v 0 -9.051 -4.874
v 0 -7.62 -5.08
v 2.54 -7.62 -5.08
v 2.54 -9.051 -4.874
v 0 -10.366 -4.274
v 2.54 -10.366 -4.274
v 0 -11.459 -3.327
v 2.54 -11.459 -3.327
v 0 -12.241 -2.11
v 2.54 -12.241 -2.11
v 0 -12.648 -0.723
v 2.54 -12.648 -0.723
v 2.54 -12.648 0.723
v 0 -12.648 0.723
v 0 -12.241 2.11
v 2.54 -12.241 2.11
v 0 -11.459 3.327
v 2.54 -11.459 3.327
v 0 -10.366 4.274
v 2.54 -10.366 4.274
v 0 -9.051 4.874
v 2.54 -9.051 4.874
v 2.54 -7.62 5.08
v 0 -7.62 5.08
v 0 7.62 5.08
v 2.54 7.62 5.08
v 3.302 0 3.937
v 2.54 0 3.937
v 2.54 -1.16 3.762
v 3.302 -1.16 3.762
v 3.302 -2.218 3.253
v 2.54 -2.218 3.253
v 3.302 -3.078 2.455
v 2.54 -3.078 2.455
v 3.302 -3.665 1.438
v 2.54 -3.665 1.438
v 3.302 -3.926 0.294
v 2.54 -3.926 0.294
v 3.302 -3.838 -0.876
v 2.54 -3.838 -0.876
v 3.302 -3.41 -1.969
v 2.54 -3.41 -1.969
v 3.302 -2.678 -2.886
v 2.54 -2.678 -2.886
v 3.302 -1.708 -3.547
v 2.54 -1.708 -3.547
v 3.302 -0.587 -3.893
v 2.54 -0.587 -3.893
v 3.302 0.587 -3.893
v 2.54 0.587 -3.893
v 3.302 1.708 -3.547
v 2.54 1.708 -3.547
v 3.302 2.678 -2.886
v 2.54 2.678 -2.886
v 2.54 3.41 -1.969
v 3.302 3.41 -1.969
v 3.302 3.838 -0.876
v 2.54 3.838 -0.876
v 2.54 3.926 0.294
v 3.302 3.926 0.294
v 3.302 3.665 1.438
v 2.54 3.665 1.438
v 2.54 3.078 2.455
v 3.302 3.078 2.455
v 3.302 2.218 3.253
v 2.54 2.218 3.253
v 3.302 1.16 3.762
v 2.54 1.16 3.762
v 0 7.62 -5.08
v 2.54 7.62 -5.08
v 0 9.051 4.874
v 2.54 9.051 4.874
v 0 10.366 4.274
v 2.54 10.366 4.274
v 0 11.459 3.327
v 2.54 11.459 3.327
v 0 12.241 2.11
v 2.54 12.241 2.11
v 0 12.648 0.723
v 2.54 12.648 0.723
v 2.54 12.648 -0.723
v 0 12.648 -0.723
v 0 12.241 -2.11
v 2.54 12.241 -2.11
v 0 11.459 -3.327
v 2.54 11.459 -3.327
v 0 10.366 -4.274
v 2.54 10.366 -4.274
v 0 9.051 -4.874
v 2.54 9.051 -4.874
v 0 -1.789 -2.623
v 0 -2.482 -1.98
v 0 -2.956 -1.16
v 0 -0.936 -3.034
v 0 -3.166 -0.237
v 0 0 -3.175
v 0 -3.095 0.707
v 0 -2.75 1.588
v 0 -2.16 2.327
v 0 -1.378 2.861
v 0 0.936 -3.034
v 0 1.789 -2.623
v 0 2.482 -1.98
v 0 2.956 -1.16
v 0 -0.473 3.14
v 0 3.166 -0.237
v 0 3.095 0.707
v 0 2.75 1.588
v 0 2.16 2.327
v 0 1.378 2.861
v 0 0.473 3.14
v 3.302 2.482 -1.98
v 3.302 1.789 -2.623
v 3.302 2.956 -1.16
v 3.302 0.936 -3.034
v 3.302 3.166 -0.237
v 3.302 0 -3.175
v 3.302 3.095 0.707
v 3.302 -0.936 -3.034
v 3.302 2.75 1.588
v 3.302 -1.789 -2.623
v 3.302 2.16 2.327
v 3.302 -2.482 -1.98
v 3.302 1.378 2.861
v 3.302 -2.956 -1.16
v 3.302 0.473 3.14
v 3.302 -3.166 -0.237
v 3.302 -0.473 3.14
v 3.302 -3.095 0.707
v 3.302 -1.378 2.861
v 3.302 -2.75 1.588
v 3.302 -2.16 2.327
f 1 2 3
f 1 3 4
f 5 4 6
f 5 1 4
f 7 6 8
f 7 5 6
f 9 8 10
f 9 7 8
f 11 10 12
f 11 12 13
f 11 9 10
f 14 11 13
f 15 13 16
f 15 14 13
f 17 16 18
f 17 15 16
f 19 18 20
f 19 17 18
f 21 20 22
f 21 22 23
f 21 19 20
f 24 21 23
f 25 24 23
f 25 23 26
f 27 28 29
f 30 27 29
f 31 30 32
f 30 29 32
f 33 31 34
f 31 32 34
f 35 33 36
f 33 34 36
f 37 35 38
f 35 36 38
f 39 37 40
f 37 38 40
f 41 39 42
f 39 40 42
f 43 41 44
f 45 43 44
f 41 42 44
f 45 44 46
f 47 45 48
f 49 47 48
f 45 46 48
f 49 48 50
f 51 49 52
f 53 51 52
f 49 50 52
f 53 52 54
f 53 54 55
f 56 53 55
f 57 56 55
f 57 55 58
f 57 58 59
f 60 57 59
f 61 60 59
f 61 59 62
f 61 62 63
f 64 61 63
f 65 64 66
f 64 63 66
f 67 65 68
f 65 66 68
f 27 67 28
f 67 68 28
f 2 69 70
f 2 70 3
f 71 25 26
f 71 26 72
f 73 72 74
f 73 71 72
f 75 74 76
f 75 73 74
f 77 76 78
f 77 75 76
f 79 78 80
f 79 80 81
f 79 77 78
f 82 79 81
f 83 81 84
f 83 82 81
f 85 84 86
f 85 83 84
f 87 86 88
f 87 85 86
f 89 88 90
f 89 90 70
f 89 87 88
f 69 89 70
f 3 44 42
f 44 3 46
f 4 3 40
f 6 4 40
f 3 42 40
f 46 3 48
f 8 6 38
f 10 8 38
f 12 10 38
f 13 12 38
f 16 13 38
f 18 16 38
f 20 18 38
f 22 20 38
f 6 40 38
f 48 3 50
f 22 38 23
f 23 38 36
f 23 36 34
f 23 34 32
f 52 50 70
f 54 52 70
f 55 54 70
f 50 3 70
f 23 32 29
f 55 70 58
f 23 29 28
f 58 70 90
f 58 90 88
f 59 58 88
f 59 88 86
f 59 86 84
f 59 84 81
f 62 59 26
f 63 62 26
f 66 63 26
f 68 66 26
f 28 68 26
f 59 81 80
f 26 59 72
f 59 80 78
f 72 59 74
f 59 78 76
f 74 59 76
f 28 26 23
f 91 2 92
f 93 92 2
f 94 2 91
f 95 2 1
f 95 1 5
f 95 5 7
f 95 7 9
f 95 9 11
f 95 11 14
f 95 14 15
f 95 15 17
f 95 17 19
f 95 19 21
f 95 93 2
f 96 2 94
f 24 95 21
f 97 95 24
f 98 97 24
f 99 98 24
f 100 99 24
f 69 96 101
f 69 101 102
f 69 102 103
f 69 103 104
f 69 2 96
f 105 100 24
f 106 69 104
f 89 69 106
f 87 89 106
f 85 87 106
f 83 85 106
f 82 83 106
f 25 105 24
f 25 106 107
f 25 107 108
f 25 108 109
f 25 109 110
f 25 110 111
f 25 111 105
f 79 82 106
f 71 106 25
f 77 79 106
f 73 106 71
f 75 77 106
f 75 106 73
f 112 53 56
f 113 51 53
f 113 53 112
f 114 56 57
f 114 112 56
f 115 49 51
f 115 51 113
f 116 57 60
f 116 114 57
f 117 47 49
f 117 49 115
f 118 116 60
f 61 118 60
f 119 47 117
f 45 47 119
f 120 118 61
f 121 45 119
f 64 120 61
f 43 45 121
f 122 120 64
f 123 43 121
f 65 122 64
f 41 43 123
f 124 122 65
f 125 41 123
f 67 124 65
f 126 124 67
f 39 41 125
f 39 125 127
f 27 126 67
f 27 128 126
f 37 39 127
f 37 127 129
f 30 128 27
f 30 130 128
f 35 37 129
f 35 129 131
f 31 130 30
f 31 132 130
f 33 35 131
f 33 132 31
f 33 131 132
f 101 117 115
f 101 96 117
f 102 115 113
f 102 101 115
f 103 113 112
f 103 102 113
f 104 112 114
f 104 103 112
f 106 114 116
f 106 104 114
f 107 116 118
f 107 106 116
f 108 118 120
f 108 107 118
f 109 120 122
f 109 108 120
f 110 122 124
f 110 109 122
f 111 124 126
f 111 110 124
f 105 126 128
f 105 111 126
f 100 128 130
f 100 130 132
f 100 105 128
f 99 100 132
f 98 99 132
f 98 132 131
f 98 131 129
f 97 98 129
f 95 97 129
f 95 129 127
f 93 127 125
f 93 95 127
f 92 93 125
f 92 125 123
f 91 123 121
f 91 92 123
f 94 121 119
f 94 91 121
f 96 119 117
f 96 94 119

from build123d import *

# Parameters (mm, degrees)
SKETCH1_R           = 3.175
BOSS_EXTRUDE1_DEPTH = 2.54
SKETCH2_R           = 3.937
SKETCH2_R_2         = 3.175
BOSS_EXTRUDE2_DEPTH = 0.762


with BuildPart() as part:
    # Sketch1 → Boss-Extrude1 (new body)
    with BuildSketch(Plane(origin=(0, 0, 0), x_dir=(0, 0, -1), z_dir=(1, 0, 0))):
        with BuildLine():
            Line((5.08, 7.62), (5.08, -7.62))
            ThreePointArc((5.08, -7.62), (0, -12.7), (-5.08, -7.62))
            Line((-5.08, -7.62), (-5.08, 7.62))
            ThreePointArc((-5.08, 7.62), (0, 12.7), (5.08, 7.62))
        make_face()
        Circle(SKETCH1_R, mode=Mode.SUBTRACT)
    extrude(amount=BOSS_EXTRUDE1_DEPTH)

    # Sketch2 → Boss-Extrude2 (add)
    with BuildSketch(Plane(origin=(2.54, 0, 0), x_dir=(0, 0, -1), z_dir=(1, 0, 0))):
        Circle(SKETCH2_R)
        Circle(SKETCH2_R_2, mode=Mode.SUBTRACT)
    extrude(amount=BOSS_EXTRUDE2_DEPTH)


solid = part.part
